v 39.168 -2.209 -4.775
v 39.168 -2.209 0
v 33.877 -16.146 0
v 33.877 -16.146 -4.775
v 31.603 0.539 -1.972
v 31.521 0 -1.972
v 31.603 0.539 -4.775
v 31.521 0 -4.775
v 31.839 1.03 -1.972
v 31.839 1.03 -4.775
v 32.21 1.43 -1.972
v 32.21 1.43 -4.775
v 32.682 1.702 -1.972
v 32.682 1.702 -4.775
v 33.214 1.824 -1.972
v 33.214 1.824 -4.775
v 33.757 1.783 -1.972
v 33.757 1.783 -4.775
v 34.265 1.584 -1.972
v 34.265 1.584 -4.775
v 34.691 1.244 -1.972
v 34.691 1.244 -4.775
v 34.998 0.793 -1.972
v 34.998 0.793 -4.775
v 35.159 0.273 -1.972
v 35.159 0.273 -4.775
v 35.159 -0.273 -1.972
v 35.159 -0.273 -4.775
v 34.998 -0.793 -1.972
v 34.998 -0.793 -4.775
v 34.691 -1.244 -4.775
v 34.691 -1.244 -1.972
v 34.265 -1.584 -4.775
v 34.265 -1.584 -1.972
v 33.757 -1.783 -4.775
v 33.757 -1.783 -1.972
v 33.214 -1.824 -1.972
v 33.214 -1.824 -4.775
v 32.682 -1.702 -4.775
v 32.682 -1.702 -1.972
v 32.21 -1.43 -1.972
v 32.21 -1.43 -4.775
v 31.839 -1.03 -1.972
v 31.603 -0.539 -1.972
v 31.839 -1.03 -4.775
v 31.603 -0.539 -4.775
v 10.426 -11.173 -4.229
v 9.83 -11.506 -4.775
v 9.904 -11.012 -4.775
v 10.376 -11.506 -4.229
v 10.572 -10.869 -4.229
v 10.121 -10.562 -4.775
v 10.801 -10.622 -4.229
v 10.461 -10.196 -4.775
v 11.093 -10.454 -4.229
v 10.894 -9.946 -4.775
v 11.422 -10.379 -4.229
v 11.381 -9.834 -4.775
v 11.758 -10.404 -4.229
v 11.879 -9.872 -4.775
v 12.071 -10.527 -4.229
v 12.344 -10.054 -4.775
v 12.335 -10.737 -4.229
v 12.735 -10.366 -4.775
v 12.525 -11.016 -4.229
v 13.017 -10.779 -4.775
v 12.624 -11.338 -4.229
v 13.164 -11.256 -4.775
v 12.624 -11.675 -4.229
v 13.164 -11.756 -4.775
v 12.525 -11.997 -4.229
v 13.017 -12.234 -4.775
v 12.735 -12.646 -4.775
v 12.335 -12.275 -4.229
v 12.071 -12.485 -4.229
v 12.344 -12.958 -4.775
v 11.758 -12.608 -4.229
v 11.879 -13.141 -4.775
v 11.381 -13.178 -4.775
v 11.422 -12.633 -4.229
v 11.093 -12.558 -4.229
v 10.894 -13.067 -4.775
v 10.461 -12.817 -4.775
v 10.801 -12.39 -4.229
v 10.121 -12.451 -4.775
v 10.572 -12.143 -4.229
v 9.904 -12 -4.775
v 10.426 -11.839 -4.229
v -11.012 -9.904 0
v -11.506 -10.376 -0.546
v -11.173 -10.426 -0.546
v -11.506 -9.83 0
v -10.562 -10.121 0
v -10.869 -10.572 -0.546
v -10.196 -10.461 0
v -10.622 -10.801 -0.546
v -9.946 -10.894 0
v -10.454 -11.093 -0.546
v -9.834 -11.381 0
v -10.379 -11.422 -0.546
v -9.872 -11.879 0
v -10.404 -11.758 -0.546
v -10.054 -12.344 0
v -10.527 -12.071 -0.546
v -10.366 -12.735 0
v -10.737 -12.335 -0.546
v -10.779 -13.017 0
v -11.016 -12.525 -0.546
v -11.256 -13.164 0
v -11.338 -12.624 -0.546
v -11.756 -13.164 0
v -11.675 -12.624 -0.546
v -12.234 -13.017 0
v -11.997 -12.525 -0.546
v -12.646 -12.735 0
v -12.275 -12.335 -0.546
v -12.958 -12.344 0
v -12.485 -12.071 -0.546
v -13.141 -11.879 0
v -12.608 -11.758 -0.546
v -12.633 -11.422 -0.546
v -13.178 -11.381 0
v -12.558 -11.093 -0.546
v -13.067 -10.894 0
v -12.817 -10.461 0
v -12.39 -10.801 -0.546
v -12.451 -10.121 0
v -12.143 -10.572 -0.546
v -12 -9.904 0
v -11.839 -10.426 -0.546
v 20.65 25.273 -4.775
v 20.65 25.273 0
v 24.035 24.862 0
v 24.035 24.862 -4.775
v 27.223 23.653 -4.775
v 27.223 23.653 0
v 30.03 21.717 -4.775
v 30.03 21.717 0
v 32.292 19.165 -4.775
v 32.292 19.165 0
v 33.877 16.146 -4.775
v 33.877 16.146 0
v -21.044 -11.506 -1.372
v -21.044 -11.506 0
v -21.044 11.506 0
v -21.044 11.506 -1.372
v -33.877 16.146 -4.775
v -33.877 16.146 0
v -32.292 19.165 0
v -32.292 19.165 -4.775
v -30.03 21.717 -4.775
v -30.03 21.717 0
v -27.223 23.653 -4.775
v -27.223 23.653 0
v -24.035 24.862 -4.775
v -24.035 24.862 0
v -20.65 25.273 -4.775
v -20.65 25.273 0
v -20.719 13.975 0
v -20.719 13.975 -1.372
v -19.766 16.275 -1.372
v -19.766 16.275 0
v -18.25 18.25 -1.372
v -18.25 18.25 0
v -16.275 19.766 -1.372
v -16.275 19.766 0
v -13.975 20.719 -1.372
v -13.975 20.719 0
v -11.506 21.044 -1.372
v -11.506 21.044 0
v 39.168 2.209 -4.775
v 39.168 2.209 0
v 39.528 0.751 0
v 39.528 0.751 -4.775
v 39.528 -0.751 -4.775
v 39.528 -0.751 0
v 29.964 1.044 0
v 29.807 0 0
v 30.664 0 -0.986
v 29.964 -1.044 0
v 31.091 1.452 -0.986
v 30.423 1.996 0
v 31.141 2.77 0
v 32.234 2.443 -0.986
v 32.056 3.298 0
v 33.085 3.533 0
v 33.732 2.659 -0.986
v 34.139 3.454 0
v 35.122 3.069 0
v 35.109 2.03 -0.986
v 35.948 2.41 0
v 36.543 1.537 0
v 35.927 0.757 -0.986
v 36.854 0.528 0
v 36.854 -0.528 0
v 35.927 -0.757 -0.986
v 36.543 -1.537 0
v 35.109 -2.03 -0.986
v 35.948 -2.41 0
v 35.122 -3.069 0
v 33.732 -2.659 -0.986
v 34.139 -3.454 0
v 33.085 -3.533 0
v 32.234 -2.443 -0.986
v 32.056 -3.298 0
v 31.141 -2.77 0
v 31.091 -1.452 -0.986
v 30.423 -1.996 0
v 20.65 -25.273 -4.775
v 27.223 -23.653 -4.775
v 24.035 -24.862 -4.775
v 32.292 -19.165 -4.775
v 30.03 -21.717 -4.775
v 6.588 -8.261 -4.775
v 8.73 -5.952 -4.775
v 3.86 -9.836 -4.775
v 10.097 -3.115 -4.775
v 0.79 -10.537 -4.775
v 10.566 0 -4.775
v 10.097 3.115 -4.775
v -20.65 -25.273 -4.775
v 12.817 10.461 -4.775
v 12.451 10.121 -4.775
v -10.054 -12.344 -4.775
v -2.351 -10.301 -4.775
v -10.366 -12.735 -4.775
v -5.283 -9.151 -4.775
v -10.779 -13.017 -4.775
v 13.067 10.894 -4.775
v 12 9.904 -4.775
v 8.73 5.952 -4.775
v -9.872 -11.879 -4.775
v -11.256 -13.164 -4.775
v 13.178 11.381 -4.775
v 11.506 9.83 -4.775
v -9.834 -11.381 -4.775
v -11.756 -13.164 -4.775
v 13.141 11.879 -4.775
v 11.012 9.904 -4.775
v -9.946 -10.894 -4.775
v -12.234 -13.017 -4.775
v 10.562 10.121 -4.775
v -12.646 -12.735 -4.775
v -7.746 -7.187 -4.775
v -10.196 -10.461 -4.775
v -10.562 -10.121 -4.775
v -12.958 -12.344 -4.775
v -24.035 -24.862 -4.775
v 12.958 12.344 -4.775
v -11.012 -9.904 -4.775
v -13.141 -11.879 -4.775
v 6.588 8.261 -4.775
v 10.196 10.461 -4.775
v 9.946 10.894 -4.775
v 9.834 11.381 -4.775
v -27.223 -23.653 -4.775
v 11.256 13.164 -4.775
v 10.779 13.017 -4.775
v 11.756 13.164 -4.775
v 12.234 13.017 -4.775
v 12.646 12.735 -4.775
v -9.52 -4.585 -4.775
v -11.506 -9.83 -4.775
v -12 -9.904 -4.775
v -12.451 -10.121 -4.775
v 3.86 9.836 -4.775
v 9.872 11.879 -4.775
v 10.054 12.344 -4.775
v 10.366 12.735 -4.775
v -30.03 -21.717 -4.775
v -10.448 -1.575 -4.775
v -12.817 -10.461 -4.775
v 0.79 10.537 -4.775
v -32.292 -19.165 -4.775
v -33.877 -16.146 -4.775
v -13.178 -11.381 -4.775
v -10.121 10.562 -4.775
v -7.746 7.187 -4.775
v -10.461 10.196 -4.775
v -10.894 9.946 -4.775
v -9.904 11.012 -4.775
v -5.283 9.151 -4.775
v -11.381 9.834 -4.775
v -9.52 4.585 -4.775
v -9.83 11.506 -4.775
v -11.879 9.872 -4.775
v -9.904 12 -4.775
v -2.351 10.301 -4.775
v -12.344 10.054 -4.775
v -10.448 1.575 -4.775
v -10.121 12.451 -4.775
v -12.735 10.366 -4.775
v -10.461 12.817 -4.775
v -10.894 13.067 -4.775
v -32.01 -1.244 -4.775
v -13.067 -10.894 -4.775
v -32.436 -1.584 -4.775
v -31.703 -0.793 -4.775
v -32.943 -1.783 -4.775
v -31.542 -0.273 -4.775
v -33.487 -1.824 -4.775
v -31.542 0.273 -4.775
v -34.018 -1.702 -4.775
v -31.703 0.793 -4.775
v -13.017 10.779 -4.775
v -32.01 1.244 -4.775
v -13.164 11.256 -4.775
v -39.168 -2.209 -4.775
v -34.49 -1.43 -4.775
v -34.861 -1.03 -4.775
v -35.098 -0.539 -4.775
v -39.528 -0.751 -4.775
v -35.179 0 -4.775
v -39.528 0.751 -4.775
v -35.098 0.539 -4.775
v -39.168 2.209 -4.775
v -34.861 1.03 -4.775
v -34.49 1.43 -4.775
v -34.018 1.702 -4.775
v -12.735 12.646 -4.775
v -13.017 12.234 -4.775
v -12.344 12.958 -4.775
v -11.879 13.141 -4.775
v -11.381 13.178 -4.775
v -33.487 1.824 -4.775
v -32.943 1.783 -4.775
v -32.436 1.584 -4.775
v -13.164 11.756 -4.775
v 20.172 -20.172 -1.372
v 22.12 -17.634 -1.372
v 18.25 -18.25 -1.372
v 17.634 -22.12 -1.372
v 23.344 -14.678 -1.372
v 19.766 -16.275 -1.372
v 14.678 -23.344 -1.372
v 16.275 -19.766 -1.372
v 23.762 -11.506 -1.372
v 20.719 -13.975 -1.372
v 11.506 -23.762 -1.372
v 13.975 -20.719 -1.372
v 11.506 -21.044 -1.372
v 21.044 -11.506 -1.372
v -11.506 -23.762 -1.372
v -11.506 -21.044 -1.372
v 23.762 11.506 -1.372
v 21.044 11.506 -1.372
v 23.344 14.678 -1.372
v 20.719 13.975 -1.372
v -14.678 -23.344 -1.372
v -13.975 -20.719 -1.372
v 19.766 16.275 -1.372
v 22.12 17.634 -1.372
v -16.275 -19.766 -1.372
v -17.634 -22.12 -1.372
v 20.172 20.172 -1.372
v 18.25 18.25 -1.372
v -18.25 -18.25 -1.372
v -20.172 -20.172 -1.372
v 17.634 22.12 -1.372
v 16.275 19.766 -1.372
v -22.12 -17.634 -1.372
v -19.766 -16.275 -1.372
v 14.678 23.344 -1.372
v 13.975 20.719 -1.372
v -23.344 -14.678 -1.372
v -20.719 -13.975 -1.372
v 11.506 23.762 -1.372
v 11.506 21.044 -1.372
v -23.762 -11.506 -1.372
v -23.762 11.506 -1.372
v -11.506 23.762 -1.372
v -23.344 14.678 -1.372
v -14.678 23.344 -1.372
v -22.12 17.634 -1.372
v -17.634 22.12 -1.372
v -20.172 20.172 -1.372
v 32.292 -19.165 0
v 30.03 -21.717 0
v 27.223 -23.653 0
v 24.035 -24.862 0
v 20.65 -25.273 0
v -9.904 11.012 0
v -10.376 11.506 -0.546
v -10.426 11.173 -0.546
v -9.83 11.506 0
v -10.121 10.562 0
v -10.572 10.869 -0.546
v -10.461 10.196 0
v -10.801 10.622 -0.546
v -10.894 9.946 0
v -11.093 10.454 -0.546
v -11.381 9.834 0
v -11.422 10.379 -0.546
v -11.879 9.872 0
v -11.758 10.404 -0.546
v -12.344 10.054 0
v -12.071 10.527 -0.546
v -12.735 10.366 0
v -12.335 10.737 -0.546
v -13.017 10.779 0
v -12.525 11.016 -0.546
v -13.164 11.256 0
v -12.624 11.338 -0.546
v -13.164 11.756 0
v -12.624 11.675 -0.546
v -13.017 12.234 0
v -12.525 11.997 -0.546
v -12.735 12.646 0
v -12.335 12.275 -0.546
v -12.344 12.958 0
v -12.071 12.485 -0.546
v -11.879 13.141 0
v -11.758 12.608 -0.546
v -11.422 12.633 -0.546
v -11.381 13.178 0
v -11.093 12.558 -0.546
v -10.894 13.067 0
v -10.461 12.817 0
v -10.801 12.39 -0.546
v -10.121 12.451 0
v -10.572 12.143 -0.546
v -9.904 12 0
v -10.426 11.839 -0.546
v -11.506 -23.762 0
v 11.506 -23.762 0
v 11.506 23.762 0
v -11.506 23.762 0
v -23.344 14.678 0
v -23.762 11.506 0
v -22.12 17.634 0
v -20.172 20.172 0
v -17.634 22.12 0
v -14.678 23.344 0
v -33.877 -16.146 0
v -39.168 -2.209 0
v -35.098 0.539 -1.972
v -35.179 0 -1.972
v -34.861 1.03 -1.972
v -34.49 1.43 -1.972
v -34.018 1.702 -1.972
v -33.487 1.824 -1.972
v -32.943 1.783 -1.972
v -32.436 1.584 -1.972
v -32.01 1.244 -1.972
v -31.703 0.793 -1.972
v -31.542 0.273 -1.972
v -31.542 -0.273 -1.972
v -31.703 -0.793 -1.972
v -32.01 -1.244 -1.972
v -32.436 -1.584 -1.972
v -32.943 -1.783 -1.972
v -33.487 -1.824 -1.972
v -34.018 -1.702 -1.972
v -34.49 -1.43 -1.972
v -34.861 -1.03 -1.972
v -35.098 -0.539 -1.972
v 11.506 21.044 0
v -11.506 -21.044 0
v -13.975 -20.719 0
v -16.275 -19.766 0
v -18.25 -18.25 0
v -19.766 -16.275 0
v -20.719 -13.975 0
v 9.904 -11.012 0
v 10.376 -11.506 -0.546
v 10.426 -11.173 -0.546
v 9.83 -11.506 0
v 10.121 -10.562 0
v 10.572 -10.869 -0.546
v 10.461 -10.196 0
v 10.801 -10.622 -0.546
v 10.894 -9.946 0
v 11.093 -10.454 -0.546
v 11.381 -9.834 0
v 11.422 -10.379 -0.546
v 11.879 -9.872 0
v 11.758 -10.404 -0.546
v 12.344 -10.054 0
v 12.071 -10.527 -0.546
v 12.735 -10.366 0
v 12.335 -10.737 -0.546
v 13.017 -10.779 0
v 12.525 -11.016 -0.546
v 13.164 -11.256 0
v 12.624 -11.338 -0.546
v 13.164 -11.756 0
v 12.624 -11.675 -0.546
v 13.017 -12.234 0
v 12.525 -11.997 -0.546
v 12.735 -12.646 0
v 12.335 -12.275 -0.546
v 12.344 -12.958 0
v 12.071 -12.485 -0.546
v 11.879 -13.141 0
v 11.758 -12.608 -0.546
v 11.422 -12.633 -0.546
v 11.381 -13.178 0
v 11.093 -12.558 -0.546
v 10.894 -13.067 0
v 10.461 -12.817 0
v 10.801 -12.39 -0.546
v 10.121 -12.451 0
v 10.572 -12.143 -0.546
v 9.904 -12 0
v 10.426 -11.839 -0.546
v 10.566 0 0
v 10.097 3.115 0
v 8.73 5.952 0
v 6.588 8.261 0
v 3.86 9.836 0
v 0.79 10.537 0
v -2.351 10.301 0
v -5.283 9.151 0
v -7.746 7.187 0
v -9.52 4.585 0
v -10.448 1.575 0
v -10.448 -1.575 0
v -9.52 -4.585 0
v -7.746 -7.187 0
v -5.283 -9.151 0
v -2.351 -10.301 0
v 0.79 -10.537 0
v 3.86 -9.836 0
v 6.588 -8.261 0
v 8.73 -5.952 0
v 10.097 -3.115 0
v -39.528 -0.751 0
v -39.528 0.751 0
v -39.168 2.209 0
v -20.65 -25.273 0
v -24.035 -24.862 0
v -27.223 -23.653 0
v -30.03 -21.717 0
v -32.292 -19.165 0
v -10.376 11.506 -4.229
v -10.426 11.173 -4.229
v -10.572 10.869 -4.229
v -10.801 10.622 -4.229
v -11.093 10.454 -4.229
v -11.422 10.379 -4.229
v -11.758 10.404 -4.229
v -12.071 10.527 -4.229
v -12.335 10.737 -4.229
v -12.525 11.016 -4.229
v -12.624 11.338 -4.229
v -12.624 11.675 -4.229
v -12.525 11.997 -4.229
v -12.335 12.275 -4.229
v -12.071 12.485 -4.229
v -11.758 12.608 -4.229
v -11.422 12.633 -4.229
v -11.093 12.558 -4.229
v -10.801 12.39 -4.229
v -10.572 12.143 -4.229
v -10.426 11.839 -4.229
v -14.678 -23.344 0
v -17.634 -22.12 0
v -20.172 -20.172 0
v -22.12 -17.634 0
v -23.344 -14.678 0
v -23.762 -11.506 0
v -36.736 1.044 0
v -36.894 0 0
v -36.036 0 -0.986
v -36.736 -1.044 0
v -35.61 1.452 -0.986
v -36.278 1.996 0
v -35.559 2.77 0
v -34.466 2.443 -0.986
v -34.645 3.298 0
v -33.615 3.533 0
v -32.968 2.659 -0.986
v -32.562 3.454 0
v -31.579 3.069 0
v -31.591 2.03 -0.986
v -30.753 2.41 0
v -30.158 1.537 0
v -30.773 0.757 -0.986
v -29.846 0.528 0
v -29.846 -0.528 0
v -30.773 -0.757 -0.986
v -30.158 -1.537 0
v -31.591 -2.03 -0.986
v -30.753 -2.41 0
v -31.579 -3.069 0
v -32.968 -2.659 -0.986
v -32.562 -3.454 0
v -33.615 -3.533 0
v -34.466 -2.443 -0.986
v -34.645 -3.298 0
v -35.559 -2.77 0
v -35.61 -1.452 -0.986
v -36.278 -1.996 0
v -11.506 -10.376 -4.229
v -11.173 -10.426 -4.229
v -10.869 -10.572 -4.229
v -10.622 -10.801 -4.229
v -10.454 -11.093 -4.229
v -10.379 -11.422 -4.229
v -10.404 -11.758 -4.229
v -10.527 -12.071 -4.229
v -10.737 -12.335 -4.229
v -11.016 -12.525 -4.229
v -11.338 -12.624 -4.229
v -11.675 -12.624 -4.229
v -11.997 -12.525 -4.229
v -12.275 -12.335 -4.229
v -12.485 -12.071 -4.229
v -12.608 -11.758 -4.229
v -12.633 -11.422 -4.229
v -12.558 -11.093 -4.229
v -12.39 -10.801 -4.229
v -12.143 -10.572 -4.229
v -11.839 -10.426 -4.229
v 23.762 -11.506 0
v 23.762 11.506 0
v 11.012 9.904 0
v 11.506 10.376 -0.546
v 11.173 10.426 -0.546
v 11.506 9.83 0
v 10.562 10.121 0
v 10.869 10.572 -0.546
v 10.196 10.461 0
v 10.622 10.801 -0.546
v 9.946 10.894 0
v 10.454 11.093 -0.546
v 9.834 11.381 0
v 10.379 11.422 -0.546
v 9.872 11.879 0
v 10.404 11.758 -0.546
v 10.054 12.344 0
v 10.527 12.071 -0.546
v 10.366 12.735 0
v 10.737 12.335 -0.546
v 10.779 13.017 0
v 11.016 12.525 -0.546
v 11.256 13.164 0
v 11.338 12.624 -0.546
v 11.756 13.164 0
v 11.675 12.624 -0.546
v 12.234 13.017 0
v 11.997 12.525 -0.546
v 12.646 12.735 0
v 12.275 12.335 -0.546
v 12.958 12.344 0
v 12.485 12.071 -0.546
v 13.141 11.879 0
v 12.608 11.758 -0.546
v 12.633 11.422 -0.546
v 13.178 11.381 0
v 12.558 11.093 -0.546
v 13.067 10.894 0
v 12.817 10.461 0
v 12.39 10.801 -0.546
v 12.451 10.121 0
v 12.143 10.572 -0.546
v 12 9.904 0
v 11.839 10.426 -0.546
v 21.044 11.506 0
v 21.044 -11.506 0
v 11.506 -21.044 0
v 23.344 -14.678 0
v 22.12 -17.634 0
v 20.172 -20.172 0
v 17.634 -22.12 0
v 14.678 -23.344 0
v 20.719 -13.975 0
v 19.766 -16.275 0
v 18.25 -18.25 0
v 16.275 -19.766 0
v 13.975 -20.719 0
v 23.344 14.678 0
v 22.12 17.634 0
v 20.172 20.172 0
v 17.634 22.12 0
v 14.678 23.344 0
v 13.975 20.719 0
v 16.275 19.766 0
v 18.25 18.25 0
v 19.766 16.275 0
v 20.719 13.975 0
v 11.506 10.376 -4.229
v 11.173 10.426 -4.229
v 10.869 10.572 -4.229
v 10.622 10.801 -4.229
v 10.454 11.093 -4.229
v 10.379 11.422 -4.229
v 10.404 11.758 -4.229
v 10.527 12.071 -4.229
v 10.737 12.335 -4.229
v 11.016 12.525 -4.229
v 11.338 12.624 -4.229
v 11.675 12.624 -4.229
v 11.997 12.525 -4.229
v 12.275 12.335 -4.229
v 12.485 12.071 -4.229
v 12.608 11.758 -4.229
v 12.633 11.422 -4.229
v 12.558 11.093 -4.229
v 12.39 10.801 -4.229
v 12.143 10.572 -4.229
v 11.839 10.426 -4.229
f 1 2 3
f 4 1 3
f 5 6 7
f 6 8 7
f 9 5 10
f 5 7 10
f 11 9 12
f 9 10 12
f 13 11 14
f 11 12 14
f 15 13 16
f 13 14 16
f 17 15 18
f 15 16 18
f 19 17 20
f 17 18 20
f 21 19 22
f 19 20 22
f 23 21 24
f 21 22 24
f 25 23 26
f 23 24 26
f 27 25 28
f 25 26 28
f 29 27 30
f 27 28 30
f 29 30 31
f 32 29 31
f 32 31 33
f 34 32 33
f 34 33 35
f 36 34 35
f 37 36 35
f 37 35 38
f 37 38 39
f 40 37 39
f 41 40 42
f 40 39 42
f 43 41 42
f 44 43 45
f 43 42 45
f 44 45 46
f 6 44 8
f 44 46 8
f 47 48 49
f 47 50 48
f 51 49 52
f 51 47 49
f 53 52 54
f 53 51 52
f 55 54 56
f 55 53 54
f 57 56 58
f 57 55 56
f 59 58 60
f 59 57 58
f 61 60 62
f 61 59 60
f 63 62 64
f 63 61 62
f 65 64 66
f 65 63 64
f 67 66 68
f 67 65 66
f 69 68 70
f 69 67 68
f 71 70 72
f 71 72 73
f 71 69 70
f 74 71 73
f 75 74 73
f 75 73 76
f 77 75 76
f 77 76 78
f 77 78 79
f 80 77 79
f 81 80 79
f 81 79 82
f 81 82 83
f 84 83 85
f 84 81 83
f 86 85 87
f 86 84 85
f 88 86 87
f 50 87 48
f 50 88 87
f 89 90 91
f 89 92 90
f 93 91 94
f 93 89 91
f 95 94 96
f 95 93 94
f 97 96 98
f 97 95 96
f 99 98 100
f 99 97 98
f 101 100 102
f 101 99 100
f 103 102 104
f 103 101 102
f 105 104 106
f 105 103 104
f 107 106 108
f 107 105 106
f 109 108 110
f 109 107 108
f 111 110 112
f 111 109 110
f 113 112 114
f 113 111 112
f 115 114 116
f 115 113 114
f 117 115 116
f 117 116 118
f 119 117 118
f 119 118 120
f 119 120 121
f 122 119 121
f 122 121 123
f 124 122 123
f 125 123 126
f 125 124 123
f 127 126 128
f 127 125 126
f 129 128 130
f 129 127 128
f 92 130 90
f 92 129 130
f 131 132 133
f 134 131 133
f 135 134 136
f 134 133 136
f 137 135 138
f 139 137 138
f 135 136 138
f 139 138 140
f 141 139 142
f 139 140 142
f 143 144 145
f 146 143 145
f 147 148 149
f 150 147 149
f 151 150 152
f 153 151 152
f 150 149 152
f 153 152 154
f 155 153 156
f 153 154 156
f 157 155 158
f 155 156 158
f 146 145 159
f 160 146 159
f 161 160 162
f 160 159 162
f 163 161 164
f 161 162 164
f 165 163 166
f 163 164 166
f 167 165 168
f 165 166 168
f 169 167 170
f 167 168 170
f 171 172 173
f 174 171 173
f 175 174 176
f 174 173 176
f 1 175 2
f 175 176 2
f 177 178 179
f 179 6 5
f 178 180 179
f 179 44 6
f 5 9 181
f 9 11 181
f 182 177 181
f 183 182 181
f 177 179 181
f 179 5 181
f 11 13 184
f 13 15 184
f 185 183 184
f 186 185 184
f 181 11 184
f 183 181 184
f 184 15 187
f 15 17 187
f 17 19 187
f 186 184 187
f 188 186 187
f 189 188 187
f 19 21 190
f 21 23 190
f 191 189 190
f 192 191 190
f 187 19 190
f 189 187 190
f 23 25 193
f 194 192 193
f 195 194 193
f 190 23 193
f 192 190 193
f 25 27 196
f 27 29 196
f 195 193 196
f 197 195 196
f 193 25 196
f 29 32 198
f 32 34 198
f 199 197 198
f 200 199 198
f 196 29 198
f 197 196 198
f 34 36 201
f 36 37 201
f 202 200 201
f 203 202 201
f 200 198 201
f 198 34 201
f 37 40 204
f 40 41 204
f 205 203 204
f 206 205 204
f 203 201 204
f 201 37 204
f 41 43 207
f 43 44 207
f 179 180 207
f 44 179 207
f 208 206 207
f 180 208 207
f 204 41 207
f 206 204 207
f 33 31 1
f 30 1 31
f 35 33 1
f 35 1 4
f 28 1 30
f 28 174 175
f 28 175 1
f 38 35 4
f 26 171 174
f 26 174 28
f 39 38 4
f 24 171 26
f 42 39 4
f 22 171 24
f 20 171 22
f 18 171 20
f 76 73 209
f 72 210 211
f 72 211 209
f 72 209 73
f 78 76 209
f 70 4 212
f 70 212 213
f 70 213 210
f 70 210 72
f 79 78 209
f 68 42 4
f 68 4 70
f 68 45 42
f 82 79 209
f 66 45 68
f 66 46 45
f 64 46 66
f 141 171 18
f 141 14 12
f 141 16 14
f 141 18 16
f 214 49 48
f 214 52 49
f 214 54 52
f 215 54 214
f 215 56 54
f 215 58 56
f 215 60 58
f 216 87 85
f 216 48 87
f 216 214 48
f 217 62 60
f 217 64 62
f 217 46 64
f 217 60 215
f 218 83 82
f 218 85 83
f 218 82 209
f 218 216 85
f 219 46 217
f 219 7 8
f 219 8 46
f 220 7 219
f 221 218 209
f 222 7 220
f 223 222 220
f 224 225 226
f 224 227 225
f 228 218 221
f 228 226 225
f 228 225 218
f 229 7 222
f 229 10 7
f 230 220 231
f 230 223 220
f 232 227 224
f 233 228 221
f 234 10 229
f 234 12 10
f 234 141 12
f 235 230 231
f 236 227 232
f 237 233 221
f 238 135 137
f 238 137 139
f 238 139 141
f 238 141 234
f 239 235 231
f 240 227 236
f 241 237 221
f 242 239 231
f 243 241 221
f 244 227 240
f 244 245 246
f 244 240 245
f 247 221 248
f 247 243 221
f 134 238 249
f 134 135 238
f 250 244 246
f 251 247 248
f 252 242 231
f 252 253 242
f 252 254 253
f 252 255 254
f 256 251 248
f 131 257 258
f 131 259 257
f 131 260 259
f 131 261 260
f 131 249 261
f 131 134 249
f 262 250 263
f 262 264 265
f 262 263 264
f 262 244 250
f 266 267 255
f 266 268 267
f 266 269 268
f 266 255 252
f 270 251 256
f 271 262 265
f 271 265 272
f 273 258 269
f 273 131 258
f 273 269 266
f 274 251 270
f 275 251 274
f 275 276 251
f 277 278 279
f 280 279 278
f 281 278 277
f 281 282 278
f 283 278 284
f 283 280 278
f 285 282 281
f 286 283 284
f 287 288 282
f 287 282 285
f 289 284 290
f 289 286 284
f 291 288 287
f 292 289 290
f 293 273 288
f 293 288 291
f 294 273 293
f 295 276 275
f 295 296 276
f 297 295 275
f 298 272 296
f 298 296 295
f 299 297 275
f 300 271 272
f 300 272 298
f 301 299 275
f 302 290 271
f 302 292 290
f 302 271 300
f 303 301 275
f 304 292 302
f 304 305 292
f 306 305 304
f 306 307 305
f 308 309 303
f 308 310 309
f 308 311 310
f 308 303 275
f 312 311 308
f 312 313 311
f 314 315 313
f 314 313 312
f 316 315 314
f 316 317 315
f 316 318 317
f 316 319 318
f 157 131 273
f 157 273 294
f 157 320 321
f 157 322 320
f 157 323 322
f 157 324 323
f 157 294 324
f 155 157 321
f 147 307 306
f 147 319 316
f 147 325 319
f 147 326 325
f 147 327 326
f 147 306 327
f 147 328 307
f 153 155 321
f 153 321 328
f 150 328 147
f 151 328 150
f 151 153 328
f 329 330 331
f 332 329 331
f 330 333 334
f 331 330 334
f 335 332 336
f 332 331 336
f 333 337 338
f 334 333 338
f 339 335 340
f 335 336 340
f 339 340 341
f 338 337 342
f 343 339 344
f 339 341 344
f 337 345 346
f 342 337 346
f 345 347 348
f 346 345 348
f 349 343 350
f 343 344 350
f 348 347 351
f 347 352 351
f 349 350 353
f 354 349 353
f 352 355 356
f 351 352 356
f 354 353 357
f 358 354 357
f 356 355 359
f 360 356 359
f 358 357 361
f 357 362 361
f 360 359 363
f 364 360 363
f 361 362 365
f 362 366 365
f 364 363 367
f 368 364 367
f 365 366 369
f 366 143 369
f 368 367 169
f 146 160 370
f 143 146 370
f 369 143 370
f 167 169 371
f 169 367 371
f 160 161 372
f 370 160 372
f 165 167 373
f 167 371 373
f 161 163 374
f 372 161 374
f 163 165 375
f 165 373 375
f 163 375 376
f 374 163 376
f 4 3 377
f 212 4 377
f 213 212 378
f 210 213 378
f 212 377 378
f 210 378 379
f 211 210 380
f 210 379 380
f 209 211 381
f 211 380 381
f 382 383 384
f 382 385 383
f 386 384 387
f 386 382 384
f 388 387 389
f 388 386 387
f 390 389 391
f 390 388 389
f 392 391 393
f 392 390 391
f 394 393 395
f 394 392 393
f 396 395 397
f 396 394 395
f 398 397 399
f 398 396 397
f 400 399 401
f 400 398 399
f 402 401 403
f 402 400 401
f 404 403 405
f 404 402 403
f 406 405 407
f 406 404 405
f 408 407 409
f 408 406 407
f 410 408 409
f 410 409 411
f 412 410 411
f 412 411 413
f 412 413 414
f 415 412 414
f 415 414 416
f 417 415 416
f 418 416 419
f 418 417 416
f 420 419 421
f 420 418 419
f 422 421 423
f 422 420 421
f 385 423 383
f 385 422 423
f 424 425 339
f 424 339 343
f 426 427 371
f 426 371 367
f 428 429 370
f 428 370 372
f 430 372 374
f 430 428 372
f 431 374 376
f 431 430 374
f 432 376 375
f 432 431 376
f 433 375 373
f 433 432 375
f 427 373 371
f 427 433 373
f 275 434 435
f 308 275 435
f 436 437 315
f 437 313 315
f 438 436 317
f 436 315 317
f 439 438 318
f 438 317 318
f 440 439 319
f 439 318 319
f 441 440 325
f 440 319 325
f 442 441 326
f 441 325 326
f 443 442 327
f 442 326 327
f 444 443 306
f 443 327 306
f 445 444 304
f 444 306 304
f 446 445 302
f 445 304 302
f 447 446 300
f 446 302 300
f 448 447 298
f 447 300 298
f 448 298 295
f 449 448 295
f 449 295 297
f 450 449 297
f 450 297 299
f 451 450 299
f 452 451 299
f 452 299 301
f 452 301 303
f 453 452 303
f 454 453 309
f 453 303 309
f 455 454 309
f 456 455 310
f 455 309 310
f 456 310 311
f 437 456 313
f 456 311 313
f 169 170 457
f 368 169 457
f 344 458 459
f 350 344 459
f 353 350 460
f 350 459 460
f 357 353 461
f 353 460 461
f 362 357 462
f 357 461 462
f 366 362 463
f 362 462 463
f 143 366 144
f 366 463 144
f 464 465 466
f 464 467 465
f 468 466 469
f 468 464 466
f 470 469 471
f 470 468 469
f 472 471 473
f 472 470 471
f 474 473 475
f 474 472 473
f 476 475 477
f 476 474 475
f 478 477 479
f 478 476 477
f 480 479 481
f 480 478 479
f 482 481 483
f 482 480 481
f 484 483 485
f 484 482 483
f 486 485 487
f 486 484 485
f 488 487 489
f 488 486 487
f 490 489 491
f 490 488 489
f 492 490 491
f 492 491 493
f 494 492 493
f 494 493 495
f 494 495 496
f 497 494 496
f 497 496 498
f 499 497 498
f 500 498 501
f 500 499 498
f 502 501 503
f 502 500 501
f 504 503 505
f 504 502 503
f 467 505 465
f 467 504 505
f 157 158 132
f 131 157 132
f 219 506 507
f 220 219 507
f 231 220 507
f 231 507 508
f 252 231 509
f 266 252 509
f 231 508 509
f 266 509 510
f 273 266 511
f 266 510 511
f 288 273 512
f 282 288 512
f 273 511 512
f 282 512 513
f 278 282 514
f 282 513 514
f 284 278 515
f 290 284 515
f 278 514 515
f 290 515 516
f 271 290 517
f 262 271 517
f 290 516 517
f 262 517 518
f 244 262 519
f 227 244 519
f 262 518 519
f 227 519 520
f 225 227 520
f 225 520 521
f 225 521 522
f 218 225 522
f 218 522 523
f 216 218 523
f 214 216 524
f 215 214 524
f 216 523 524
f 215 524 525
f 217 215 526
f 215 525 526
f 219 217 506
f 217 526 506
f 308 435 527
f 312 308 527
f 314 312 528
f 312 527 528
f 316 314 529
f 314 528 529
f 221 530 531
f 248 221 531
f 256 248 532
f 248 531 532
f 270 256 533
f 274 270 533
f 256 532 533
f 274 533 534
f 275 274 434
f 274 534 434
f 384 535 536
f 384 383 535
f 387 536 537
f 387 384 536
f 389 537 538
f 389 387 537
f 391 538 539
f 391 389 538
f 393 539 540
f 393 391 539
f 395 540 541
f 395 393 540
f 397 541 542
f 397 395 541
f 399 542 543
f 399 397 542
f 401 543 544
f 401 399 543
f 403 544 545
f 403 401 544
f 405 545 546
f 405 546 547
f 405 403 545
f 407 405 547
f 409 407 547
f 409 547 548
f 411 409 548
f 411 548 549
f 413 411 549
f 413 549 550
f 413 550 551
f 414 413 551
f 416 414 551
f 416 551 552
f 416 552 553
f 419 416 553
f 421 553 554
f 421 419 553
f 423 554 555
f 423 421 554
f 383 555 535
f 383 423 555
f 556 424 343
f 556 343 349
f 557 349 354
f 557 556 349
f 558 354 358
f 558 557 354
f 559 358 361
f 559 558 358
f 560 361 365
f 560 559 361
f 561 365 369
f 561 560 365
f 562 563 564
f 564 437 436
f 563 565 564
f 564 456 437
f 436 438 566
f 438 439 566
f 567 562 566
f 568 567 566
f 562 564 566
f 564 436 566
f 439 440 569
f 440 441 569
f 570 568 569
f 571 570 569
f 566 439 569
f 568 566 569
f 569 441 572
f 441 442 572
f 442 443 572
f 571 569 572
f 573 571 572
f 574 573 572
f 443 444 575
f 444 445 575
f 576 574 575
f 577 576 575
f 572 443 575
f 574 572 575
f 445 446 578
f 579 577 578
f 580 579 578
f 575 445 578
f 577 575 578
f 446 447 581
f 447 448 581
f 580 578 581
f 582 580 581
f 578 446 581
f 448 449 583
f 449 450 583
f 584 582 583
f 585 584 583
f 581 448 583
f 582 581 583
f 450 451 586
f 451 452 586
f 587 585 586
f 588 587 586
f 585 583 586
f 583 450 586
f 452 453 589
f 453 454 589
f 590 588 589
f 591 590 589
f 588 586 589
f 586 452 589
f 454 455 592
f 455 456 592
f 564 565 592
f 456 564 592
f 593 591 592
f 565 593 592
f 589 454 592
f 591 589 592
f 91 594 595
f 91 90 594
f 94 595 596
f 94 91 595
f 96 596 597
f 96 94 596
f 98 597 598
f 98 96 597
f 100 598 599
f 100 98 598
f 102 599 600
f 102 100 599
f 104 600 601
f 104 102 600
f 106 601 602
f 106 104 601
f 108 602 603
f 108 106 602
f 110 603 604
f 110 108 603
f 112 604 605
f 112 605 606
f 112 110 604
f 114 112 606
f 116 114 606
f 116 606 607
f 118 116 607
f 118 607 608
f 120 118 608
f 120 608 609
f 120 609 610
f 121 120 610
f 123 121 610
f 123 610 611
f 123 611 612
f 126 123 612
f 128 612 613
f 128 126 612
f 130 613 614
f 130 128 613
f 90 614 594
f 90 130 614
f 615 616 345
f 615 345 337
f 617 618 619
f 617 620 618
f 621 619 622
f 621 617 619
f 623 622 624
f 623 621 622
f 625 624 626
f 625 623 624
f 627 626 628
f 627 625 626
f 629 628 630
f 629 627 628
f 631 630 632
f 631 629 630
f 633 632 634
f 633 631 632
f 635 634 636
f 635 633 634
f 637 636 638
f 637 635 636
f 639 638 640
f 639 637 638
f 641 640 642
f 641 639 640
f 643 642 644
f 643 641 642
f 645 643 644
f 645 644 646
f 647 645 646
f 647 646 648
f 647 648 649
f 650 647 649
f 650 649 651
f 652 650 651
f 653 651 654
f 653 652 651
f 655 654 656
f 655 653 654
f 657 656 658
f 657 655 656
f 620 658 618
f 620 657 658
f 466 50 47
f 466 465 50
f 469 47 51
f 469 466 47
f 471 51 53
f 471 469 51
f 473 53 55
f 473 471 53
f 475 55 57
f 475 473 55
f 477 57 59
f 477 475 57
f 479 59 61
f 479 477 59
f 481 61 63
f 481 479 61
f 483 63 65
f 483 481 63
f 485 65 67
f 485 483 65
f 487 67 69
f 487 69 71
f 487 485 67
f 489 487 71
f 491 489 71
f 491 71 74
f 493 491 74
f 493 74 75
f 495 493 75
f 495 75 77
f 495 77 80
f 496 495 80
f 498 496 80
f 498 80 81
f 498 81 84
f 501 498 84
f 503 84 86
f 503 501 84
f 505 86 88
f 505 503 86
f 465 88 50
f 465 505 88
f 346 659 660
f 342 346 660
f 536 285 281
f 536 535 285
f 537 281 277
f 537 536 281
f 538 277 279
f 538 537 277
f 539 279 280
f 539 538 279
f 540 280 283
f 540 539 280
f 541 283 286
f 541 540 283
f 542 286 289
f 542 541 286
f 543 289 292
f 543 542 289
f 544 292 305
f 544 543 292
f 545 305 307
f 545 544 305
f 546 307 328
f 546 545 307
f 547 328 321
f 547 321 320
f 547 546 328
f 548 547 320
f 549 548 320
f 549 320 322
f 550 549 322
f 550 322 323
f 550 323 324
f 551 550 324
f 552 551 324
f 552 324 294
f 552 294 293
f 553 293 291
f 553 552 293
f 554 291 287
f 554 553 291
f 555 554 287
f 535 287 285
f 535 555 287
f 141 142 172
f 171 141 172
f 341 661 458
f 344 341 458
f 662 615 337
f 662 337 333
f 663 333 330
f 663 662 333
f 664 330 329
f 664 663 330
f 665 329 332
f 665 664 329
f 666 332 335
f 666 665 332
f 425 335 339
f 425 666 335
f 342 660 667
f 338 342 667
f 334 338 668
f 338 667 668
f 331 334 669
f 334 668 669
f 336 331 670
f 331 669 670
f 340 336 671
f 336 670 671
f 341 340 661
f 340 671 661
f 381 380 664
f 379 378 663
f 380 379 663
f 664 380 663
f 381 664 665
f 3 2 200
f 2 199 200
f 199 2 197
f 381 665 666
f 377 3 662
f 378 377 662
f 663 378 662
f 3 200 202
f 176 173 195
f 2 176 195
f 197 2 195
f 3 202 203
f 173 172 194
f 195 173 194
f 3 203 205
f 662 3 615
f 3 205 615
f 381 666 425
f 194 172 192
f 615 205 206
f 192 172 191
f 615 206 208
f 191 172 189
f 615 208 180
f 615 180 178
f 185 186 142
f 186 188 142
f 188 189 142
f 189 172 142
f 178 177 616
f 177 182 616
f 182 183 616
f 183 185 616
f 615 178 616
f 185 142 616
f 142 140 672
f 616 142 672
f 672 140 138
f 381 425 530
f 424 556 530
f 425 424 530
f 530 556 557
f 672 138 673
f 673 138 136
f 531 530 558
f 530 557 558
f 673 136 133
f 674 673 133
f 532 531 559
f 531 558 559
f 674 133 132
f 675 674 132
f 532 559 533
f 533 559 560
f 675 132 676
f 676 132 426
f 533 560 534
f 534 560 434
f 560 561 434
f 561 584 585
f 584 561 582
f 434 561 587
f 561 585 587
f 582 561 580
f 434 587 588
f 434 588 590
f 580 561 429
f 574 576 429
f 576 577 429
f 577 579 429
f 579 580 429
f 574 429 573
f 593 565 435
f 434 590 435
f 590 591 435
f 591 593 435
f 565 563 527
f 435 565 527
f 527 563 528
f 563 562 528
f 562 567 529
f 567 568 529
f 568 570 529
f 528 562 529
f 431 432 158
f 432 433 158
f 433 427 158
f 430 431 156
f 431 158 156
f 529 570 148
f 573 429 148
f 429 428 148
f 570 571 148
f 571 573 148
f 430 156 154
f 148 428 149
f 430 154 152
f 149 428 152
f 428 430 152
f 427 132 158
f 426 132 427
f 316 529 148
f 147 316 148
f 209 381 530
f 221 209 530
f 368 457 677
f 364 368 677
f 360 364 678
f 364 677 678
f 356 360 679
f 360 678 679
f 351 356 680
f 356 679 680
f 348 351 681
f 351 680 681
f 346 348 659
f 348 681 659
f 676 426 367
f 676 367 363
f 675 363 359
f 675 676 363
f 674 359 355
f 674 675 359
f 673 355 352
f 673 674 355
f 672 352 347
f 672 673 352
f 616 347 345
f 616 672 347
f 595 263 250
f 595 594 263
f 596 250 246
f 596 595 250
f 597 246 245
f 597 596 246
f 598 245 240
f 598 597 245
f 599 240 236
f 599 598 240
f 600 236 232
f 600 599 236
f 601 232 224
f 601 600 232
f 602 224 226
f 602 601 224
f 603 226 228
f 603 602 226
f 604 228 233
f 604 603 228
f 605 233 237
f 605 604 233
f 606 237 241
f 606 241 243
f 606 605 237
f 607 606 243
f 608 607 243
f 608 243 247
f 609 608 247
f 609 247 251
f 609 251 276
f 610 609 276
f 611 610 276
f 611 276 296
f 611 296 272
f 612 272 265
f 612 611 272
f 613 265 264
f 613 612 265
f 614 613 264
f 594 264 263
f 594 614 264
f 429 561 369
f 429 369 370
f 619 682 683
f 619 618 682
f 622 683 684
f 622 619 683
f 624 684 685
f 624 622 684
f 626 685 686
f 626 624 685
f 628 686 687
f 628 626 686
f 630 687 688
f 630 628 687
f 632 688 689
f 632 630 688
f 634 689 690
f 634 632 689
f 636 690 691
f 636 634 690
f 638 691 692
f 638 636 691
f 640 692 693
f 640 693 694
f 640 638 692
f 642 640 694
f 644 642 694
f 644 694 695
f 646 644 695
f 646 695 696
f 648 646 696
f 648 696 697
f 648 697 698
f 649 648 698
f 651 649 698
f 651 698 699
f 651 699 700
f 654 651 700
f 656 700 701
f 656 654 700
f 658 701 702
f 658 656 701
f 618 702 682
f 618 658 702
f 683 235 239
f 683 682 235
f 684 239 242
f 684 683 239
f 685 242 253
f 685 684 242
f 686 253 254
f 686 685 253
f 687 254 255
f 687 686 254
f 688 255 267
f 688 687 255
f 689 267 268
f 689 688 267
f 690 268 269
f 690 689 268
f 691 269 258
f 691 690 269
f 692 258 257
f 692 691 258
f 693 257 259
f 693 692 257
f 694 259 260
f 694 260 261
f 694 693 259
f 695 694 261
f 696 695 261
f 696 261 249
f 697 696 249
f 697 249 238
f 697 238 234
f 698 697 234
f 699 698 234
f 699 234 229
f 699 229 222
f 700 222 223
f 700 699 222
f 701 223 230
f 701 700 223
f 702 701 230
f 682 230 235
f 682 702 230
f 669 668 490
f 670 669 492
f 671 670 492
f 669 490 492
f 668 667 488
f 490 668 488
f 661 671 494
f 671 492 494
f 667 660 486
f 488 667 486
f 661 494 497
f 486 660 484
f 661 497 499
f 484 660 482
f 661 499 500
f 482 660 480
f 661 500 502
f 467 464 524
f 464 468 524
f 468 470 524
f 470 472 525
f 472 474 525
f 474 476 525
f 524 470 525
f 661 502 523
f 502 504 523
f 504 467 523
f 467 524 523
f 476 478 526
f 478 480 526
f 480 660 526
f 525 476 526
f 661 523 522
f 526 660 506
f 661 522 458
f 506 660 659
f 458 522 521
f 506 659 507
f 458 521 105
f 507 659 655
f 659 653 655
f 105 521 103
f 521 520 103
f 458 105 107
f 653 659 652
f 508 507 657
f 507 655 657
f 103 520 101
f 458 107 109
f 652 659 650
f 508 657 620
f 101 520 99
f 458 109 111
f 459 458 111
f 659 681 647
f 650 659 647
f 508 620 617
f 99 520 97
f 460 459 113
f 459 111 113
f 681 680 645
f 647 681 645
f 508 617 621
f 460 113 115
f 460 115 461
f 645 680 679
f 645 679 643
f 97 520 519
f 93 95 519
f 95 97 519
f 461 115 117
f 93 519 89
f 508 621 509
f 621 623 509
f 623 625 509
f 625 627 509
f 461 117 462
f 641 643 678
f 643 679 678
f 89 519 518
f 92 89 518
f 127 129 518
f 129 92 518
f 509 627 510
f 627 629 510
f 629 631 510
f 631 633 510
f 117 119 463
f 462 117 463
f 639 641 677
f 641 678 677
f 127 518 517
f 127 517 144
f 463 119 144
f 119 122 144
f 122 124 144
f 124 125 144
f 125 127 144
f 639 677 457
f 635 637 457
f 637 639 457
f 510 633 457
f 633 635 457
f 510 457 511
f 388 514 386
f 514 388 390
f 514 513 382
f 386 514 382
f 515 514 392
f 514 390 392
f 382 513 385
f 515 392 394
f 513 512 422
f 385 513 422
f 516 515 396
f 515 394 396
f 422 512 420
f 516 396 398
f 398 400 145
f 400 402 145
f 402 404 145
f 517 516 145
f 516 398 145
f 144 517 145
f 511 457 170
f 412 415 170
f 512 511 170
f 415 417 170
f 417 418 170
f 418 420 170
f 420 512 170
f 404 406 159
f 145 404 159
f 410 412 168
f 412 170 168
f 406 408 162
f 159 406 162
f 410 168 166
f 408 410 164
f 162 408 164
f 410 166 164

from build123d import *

# Parameters (mm, degrees)
SKETCH1_R                                      = 10.5664
BOSS_EXTRUDE1_DEPTH                            = 4.7752
CIRPATTERN1_COUNT                              = 4
CSK_FOR_6_FLAT_HEAD_MACHINE_SCREW1_D           = 3.6576
CSK_FOR_6_FLAT_HEAD_MACHINE_SCREW1_CSINK_D     = 7.0866
CSK_FOR_6_FLAT_HEAD_MACHINE_SCREW1_CSINK_ANGLE = 82
CUT_EXTRUDE1_DEPTH                             = 1.3716


with BuildPart() as part:
    # Sketch1 → Boss-Extrude1 (new body)
    with BuildSketch(Plane.XY):
        with BuildLine():
            Line((-20.6502, 25.273), (20.6502, 25.273))
            ThreePointArc((20.6502, 25.273), (28.685169884, 22.769919997), (33.876987837, 16.146387942))
            Line((33.876987837, 16.146387942), (39.16808693, 2.208601518))
            ThreePointArc((39.16808693, 2.208601518), (39.5732, 0), (39.16808693, -2.208601518))
            Line((39.16808693, -2.208601518), (33.876987837, -16.146387942))
            ThreePointArc((33.876987837, -16.146387942), (28.685169884, -22.769919997), (20.6502, -25.273))
            Line((20.6502, -25.273), (-20.6502, -25.273))
            ThreePointArc((-20.6502, -25.273), (-28.685169884, -22.769919997), (-33.876987837, -16.146387942))
            Line((-33.876987837, -16.146387942), (-39.16808693, -2.208601518))
            ThreePointArc((-39.16808693, -2.208601518), (-39.5732, 0), (-39.16808693, 2.208601518))
            Line((-39.16808693, 2.208601518), (-33.876987837, 16.146387942))
            ThreePointArc((-33.876987837, 16.146387942), (-28.685169884, 22.769919997), (-20.6502, 25.273))
        make_face()
        Circle(SKETCH1_R, mode=Mode.SUBTRACT)
    extrude(amount=-BOSS_EXTRUDE1_DEPTH)

    # Sketch2 → #4-40 Tapped Hole1 (revolve, cut)
    with BuildSketch(Plane(origin=(11.5062, 11.5062, 0), x_dir=(0, -1, 0), z_dir=(1, 0, 0))):
        Polygon((0, 0), (0, 4.7752), (1.6764, 4.7752), (1.1303, 4.2291), (1.1303, 0.5461), (1.6764, 0), align=None)
    f_4_40_tapped_hole1 = revolve(axis=Axis((11.5062, 11.5062, 6.35), (0, 0, -1)), mode=Mode.SUBTRACT)

    # CirPattern1: #4-40 Tapped Hole1 ×4 about axis
    cirpattern1_axis = Axis((0, 0, 0), (0, 0, 1))
    for i in range(1, CIRPATTERN1_COUNT):
        add(f_4_40_tapped_hole1.rotate(cirpattern1_axis, i * 360 / CIRPATTERN1_COUNT), mode=Mode.SUBTRACT)

    # CSK for #6 Flat Head Machine Screw1 (through all)
    with Locations(Plane.XY):
        with Locations((33.3502, 0), (-33.3502, 0)):
            CounterSinkHole(CSK_FOR_6_FLAT_HEAD_MACHINE_SCREW1_D / 2, CSK_FOR_6_FLAT_HEAD_MACHINE_SCREW1_CSINK_D / 2, counter_sink_angle=CSK_FOR_6_FLAT_HEAD_MACHINE_SCREW1_CSINK_ANGLE)

    # Sketch6 → Cut-Extrude1 (cut)
    with BuildSketch(Plane.XY):
        with BuildLine():
            Line((23.7617, 11.5062), (23.7617, -11.5062))
            ThreePointArc((23.7617, -11.5062), (20.172147157, -20.172147157), (11.5062, -23.7617))
            Line((11.5062, -23.7617), (-11.5062, -23.7617))
            ThreePointArc((-11.5062, -23.7617), (-20.172147157, -20.172147157), (-23.7617, -11.5062))
            Line((-23.7617, -11.5062), (-23.7617, 11.5062))
            ThreePointArc((-23.7617, 11.5062), (-20.172147157, 20.172147157), (-11.5062, 23.7617))
            Line((-11.5062, 23.7617), (11.5062, 23.7617))
            ThreePointArc((11.5062, 23.7617), (20.172147157, 20.172147157), (23.7617, 11.5062))
        make_face()
        with BuildLine():
            Line((21.0439, 11.5062), (21.0439, -11.5062))
            ThreePointArc((21.0439, -11.5062), (18.250372347, -18.250372347), (11.5062, -21.0439))
            Line((11.5062, -21.0439), (-11.5062, -21.0439))
            ThreePointArc((-11.5062, -21.0439), (-18.250372347, -18.250372347), (-21.0439, -11.5062))
            Line((-21.0439, -11.5062), (-21.0439, 11.5062))
            ThreePointArc((-21.0439, 11.5062), (-18.250372347, 18.250372347), (-11.5062, 21.0439))
            Line((-11.5062, 21.0439), (11.5062, 21.0439))
            ThreePointArc((11.5062, 21.0439), (18.250372347, 18.250372347), (21.0439, 11.5062))
        make_face(mode=Mode.SUBTRACT)
    extrude(amount=-CUT_EXTRUDE1_DEPTH, mode=Mode.SUBTRACT)


solid = part.part
